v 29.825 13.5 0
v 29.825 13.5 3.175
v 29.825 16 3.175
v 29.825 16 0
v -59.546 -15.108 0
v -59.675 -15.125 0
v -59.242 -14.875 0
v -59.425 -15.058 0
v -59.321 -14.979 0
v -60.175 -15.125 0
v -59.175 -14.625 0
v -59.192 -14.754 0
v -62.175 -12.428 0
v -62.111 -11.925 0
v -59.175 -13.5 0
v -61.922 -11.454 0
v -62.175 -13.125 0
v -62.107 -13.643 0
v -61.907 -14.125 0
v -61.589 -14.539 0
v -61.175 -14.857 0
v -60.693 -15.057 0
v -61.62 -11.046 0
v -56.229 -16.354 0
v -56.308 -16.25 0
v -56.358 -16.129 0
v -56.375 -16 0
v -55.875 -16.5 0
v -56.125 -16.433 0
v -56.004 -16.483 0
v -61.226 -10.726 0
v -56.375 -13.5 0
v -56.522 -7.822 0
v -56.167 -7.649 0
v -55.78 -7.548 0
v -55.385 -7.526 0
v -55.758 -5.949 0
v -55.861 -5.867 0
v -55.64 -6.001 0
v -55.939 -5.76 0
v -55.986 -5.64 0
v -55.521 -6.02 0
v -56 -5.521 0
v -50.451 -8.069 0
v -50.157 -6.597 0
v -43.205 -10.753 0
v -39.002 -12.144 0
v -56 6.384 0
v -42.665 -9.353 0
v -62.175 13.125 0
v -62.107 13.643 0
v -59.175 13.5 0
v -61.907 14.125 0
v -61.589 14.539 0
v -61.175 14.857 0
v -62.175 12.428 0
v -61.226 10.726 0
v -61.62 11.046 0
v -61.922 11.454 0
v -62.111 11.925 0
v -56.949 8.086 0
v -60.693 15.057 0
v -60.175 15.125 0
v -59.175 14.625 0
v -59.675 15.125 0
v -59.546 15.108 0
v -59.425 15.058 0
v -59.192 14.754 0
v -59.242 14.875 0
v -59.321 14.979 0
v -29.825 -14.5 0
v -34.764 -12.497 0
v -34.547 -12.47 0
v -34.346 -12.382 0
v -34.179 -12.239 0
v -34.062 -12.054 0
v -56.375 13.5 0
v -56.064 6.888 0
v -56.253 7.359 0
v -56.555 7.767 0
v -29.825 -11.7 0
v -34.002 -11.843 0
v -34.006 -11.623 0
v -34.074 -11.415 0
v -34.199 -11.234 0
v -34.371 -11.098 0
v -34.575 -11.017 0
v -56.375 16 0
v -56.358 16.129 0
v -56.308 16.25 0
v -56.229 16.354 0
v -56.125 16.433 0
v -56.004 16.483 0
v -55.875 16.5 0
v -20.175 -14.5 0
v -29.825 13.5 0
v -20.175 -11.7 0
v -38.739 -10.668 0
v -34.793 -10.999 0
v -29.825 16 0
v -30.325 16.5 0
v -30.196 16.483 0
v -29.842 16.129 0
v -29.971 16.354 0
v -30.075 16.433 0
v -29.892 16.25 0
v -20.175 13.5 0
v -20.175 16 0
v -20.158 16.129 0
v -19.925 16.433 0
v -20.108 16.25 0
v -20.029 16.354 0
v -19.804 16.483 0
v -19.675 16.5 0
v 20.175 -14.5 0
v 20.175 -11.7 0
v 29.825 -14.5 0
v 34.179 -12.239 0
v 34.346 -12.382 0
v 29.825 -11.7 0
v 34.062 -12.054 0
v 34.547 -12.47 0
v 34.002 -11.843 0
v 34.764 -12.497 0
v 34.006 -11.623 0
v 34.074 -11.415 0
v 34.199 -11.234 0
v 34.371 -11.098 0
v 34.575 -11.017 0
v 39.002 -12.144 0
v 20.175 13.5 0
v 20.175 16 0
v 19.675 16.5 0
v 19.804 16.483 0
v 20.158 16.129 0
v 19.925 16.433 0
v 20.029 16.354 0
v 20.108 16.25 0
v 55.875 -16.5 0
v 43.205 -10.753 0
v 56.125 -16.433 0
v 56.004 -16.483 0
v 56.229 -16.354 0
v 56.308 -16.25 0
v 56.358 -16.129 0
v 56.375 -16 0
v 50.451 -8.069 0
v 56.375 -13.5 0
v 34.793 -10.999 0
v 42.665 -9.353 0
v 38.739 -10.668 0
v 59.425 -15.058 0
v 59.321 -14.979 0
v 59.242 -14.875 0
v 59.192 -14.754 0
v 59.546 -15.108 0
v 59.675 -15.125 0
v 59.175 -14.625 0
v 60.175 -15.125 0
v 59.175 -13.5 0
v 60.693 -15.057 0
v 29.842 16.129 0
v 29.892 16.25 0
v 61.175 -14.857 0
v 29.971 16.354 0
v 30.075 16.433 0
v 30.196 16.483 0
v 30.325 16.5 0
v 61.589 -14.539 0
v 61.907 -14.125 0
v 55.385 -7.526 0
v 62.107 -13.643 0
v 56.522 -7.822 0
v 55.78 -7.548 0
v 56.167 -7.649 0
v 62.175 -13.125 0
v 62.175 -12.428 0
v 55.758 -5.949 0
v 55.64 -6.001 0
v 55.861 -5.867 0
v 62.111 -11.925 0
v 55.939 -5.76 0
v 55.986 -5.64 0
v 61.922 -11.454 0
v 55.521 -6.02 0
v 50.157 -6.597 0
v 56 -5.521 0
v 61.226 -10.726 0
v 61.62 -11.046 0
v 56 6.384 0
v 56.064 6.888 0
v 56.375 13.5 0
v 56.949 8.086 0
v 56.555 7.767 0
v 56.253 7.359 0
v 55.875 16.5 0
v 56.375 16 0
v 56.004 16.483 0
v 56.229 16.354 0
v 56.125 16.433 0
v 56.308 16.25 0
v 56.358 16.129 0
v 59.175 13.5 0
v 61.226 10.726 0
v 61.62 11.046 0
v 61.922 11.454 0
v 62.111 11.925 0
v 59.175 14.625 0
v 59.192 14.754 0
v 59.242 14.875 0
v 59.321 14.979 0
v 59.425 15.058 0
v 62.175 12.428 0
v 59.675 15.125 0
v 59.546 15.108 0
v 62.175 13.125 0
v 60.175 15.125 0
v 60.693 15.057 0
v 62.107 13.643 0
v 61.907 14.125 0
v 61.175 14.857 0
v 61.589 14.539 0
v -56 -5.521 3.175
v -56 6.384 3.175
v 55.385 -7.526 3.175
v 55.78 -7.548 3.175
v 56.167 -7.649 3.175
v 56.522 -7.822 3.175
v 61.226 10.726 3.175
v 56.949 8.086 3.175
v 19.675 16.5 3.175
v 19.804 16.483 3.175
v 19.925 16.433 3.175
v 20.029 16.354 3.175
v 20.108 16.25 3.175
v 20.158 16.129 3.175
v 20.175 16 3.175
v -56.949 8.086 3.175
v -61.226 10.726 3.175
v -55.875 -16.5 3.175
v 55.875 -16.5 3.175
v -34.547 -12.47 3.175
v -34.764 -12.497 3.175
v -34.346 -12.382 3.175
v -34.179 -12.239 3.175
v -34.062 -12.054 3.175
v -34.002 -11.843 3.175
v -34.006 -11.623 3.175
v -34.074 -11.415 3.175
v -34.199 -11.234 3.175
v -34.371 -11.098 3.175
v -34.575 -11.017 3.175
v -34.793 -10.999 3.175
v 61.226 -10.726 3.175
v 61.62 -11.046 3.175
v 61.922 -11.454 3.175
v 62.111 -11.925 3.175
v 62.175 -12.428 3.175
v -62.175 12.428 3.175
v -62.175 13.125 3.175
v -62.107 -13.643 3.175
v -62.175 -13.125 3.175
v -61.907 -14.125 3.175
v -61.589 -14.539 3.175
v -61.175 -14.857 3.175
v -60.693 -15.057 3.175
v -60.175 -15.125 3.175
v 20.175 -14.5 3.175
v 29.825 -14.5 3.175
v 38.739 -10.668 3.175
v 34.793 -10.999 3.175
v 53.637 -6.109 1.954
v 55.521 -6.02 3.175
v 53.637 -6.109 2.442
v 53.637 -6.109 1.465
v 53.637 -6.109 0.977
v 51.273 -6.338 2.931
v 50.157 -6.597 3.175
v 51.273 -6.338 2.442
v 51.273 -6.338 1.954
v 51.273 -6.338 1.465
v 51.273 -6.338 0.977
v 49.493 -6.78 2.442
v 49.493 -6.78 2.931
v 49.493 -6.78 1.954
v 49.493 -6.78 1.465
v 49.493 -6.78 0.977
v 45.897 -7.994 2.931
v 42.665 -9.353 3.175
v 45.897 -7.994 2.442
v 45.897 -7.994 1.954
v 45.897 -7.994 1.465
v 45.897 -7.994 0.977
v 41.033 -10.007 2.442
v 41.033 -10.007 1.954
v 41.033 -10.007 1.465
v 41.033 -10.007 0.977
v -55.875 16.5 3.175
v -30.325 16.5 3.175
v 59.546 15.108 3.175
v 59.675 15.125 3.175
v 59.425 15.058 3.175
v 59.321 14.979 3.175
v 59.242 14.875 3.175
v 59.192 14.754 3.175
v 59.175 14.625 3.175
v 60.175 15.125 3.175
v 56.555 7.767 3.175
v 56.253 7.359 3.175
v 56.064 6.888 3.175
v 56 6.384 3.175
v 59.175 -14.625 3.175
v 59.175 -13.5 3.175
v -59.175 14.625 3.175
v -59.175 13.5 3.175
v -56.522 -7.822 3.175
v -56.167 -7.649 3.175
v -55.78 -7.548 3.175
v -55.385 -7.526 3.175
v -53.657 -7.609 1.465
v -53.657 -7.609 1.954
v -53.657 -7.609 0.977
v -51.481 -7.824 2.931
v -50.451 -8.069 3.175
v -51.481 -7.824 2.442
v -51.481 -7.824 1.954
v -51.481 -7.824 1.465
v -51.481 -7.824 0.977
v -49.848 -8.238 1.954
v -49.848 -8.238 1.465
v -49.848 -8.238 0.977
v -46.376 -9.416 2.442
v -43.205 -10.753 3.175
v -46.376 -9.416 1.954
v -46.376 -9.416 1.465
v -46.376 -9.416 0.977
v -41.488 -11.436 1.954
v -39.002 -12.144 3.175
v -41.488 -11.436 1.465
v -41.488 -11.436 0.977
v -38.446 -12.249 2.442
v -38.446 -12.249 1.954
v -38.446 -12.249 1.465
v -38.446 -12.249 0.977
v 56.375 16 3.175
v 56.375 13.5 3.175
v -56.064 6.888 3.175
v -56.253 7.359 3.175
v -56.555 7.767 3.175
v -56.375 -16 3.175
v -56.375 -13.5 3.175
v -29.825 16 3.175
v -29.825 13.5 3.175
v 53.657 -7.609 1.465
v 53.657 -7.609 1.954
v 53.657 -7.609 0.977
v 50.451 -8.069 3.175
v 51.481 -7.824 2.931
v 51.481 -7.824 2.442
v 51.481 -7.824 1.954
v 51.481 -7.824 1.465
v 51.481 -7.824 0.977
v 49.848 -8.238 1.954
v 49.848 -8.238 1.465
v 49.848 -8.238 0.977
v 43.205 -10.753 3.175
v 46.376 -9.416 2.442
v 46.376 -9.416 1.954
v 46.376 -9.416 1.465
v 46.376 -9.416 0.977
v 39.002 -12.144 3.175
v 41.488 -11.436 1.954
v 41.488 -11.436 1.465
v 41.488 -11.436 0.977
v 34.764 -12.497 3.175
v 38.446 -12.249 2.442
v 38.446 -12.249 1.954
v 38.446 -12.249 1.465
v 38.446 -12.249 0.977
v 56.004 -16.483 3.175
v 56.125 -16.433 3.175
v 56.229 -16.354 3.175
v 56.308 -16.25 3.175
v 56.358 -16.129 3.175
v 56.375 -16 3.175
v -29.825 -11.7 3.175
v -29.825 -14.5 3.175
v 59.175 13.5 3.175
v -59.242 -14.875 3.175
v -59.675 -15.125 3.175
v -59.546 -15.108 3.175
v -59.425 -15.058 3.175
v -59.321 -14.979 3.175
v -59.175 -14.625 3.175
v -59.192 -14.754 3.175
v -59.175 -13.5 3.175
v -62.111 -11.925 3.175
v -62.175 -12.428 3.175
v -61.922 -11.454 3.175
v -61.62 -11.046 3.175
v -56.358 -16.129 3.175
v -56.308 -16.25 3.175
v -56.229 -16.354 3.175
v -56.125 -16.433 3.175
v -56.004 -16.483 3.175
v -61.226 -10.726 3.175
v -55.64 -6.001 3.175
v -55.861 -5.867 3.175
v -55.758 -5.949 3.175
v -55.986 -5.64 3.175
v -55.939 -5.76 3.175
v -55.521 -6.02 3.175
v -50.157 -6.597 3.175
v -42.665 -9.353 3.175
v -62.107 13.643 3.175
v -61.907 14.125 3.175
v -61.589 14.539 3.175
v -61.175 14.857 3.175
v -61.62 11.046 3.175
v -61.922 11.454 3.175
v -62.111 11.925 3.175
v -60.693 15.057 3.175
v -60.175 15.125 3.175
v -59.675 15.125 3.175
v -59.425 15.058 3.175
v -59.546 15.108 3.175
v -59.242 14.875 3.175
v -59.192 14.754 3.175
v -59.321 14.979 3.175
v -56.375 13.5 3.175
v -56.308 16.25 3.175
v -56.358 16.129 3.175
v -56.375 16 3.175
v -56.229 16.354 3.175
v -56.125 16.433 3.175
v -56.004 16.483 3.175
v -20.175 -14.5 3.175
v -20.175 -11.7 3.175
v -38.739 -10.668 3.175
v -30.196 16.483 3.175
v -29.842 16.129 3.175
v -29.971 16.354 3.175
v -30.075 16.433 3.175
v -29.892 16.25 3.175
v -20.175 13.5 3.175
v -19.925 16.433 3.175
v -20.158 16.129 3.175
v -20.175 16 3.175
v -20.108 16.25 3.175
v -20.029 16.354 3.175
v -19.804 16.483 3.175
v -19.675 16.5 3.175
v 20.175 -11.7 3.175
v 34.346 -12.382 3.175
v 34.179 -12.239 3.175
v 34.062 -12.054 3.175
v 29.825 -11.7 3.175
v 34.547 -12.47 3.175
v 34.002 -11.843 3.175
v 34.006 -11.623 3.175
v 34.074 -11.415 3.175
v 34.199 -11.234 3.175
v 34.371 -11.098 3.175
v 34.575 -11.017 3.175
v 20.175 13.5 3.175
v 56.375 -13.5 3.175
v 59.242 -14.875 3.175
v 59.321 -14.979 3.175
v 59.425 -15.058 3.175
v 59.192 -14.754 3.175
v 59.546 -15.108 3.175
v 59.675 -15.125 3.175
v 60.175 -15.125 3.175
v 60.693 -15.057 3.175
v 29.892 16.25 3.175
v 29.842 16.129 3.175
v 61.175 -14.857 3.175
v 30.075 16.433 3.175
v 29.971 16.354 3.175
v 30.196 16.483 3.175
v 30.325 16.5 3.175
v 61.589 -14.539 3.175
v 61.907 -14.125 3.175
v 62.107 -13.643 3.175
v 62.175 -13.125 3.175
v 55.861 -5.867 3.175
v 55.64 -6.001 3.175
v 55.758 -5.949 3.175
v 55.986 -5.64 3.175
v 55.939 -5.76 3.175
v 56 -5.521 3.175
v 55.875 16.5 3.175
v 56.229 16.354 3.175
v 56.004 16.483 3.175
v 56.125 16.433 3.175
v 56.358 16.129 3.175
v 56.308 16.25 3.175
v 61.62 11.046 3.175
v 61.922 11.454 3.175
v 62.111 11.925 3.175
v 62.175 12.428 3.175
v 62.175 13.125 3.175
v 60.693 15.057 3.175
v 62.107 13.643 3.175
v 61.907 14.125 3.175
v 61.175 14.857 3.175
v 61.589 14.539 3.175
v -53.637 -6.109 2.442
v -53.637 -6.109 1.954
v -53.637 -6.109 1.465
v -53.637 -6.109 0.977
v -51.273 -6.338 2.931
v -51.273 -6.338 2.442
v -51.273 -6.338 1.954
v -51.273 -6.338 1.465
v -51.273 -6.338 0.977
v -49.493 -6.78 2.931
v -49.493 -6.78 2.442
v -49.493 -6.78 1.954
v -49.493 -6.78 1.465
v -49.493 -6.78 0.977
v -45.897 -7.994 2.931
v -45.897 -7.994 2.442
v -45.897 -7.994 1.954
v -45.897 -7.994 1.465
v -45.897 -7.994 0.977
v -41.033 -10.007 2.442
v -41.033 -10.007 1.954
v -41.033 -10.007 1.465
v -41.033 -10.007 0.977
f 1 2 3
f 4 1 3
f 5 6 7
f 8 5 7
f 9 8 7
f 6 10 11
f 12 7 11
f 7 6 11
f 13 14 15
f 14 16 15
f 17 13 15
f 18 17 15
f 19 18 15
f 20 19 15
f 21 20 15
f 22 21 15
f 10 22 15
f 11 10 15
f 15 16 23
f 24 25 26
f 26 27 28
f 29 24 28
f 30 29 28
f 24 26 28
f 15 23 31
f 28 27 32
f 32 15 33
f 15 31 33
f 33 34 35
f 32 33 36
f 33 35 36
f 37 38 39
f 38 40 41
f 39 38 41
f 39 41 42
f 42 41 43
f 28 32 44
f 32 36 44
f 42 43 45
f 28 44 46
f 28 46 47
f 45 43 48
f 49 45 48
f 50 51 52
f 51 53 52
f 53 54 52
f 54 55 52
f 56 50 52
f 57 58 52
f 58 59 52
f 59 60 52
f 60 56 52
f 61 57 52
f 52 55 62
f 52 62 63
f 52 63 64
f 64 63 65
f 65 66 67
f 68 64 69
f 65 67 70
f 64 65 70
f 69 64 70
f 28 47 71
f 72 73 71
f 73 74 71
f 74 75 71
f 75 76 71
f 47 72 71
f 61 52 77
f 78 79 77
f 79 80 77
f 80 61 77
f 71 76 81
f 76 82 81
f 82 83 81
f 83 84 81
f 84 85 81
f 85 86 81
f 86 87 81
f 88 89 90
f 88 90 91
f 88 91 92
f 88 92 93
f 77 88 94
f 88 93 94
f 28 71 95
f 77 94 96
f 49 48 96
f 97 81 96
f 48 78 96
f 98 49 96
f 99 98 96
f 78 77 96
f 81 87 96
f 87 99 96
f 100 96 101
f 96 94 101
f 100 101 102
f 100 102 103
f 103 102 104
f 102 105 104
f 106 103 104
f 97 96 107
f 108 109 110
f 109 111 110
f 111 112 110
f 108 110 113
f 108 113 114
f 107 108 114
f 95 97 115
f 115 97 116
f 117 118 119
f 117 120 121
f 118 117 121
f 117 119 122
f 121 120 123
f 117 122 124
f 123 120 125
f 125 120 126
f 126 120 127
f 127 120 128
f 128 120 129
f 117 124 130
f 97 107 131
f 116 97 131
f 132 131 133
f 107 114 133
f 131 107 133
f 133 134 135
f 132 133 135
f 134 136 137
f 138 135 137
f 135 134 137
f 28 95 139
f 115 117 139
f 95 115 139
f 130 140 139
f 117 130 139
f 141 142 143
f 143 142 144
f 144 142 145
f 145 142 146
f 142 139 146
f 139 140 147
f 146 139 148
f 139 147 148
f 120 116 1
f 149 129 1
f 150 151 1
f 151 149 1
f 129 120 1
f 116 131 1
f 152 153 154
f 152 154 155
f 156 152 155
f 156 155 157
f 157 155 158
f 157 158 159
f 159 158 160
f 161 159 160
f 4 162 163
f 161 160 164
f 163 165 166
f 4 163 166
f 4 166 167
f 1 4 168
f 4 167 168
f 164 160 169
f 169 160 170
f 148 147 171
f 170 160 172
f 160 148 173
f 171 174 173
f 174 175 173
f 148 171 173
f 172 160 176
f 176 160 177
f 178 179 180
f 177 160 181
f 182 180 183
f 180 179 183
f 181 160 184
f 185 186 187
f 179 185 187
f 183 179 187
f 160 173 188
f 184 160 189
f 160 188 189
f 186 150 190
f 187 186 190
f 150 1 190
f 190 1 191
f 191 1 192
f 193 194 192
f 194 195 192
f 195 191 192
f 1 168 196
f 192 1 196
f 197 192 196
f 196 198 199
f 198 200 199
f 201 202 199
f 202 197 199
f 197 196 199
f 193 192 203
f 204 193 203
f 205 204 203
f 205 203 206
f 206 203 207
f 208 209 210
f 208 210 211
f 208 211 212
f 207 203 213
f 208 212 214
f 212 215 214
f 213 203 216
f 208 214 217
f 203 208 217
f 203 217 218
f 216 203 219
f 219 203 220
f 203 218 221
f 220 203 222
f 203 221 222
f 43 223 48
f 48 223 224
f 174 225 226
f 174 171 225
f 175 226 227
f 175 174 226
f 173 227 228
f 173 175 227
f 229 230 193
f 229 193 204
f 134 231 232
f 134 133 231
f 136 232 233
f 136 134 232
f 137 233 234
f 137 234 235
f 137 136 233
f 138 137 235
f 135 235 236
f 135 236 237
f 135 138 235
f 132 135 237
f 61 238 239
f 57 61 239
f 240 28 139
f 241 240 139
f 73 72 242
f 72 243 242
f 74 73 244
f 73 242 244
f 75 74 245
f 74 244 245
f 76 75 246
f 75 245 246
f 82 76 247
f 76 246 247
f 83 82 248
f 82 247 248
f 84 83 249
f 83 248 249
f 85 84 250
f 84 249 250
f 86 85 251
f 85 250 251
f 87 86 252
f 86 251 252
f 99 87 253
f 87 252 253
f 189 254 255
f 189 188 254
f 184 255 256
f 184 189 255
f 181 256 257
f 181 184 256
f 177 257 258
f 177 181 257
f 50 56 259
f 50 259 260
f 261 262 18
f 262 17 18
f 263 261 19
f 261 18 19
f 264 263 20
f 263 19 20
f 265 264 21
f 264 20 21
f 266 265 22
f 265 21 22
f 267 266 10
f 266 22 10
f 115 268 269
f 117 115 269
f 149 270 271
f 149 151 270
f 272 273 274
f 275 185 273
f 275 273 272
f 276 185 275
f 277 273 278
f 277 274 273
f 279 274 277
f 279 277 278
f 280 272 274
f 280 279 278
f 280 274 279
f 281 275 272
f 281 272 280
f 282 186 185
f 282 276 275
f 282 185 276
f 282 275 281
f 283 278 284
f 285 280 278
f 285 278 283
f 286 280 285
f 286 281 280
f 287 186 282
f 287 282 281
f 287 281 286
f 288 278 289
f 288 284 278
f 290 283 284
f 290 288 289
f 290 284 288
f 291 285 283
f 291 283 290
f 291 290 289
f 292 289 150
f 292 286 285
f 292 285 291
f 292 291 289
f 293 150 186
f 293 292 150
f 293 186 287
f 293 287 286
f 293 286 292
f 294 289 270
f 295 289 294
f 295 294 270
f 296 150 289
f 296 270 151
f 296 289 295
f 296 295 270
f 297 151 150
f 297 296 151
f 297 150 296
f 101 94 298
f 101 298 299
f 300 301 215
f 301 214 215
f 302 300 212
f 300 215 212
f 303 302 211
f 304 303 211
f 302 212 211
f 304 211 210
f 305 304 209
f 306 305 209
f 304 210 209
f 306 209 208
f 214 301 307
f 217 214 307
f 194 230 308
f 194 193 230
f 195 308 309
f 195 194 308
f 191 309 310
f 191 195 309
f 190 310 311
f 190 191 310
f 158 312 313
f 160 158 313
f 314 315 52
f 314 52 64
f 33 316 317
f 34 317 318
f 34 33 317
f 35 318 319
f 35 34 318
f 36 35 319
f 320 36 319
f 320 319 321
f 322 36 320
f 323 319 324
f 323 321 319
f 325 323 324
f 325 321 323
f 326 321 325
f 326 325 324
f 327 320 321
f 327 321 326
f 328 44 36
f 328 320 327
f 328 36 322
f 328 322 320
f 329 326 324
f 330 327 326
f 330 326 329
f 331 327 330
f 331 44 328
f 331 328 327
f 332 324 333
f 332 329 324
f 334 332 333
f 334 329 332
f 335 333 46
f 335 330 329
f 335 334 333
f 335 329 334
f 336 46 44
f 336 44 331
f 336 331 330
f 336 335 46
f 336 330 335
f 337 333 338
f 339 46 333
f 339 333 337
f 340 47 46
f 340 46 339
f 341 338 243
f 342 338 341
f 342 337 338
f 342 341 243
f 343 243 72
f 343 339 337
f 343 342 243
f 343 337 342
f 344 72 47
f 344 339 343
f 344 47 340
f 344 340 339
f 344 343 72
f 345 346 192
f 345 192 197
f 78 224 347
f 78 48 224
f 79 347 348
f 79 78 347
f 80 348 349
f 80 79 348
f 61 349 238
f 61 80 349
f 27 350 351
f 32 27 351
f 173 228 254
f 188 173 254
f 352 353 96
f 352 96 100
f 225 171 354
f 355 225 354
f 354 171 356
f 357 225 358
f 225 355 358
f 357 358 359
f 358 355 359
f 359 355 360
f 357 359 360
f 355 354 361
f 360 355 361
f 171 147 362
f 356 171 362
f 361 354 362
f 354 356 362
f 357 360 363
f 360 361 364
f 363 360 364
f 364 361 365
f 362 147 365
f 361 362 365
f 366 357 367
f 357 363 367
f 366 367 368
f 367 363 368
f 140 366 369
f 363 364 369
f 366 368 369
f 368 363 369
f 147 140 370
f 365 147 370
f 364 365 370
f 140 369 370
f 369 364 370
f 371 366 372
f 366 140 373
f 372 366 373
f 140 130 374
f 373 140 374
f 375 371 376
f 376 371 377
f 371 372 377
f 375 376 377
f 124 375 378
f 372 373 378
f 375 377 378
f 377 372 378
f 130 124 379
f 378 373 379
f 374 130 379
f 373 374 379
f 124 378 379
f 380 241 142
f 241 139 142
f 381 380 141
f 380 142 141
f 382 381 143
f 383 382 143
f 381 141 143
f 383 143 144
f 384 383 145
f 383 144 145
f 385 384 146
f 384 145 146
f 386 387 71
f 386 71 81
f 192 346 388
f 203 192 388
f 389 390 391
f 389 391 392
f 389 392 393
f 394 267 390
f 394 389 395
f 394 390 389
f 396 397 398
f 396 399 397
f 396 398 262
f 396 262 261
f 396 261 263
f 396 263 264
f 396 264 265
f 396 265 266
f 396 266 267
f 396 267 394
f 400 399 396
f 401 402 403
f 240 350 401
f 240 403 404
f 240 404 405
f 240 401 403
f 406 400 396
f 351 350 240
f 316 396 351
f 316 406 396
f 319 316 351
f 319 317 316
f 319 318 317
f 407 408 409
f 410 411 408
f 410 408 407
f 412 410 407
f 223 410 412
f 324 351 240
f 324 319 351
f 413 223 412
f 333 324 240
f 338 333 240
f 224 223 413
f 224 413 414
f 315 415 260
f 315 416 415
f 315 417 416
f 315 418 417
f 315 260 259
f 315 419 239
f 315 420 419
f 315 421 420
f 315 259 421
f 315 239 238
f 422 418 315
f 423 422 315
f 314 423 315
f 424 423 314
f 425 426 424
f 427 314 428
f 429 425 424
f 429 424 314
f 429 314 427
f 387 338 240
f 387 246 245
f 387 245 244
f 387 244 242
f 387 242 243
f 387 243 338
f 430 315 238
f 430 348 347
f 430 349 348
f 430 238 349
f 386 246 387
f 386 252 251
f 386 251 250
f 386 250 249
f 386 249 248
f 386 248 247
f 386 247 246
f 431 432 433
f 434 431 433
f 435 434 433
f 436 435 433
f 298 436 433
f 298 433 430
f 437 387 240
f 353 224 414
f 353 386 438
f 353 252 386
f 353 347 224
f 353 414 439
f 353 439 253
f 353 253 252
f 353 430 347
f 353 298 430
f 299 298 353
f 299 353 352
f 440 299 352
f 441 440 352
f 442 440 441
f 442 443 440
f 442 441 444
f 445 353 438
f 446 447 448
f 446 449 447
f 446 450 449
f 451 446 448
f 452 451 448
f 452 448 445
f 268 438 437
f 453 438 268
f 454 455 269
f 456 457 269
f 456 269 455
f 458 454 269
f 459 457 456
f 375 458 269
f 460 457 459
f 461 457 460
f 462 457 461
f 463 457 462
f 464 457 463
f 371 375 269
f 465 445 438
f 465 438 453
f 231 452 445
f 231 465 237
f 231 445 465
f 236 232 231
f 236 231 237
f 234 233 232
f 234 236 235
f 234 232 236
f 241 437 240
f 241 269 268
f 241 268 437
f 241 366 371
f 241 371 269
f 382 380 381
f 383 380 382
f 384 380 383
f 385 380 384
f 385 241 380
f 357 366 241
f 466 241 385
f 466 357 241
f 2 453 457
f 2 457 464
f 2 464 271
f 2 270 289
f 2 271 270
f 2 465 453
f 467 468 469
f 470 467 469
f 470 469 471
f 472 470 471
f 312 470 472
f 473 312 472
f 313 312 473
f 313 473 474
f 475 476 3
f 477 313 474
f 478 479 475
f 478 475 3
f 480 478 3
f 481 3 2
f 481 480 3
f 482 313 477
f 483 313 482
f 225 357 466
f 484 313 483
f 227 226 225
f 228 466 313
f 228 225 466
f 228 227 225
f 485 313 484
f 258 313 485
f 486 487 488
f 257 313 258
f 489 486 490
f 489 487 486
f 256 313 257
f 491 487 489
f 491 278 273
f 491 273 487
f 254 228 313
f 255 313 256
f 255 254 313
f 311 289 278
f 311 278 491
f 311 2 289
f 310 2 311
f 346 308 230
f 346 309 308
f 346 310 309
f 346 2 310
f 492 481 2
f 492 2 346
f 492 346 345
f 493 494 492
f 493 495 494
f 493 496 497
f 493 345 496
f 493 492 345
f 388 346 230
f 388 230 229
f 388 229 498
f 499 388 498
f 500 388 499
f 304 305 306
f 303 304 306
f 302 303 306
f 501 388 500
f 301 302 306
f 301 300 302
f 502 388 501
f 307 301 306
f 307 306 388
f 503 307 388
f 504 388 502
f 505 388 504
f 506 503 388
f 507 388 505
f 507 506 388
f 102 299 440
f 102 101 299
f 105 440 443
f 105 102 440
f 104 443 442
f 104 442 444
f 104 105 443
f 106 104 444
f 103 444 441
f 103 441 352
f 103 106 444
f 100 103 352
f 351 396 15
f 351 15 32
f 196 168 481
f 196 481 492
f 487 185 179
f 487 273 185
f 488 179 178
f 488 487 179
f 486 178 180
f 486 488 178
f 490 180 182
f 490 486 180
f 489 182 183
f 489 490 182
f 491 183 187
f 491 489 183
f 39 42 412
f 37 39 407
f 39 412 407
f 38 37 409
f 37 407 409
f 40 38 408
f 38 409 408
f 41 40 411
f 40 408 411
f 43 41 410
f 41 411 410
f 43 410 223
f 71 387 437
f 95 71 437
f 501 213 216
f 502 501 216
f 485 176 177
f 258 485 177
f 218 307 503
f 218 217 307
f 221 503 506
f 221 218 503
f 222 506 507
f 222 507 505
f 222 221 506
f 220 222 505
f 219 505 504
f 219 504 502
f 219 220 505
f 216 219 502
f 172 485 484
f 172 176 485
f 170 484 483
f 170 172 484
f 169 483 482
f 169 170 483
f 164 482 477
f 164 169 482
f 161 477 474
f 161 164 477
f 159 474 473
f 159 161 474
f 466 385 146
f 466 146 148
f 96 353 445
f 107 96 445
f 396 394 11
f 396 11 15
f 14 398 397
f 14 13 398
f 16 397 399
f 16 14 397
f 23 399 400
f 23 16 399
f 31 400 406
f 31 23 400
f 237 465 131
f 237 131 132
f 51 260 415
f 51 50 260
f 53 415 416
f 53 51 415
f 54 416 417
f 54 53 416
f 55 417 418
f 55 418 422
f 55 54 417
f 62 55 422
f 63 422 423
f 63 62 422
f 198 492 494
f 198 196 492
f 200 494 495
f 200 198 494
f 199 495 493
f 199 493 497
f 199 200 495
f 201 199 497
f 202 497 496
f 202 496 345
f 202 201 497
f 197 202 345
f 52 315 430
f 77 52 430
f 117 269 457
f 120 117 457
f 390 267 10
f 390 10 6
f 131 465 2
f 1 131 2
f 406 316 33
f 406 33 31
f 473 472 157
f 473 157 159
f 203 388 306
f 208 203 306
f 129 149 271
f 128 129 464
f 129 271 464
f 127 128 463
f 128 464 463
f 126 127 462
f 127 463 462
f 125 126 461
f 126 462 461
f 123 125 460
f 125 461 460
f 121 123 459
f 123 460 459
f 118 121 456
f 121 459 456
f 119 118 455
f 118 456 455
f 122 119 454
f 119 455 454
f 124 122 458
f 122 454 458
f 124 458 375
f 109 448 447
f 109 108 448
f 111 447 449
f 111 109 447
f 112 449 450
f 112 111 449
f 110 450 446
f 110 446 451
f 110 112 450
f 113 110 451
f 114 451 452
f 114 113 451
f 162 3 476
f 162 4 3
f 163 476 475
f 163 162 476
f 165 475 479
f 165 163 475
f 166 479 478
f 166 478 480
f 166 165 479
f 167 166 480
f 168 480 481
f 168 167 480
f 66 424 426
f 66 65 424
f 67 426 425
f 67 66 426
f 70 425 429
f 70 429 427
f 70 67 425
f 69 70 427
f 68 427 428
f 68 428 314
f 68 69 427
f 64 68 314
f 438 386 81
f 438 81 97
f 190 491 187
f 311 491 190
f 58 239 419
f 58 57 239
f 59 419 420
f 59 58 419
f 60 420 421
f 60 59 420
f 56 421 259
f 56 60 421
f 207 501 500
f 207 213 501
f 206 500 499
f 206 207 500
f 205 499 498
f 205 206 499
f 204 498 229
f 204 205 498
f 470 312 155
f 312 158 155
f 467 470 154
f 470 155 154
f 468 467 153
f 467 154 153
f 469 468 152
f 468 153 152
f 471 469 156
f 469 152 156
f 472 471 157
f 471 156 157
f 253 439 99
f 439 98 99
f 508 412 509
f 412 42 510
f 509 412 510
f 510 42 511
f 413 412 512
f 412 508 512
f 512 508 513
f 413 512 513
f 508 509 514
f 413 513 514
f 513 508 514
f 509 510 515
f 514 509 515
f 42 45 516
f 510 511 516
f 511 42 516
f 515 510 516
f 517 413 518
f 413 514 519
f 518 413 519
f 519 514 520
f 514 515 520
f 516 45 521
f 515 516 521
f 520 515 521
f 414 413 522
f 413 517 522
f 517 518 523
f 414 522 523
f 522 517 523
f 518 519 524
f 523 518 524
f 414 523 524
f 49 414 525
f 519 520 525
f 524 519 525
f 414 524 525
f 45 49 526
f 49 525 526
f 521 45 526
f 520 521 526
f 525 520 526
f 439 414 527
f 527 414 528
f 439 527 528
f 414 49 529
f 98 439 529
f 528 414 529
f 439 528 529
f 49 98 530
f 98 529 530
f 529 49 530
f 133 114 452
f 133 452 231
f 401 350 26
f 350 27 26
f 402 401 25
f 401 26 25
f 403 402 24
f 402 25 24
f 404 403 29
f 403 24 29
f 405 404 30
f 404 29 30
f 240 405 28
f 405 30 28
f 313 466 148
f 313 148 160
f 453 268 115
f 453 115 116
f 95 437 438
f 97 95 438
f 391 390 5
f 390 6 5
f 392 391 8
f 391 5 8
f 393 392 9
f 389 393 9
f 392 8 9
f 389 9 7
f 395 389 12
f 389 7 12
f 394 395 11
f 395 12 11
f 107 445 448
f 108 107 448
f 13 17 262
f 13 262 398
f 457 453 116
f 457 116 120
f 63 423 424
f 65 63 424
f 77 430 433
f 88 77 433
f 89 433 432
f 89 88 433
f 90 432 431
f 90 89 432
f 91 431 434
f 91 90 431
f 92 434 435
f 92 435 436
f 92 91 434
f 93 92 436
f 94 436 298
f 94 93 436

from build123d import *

# Parameters (mm, degrees)
SKETCH1_W           = 124.35
SKETCH1_H           = 33
BOSS_EXTRUDE1_DEPTH = 3.175
SKETCH2_W           = 9.65
SKETCH2_H           = 2.8
SKETCH2_H_2         = 3
CUT_EXTRUDE1_DEPTH  = 65.405444257
SKETCH4_W           = 2.8
SKETCH4_H           = 3
SKETCH4_W_2         = 6.175
SKETCH4_H_2         = 15
CUT_EXTRUDE2_DEPTH  = 65.405444257
SKETCH6_W           = 3
SKETCH6_H           = 1.375
CUT_EXTRUDE3_DEPTH  = 65.405444257
CUT_SWEEP1_DEPTH    = 3.175
SKETCH12_R          = 0.75
CUT_EXTRUDE6_DEPTH  = 65.405444385
CUT_EXTRUDE7_DEPTH  = 65.405444385
FILLET6_R           = 2
FILLET7_R           = 0.5


# Read off the part's stored shape, not the designer's step: Cut-Sweep1
with BuildPart() as part:
    # Sketch1 → Boss-Extrude1 (new body)
    with BuildSketch(Plane.XY):
        Rectangle(SKETCH1_W, SKETCH1_H)
    extrude(amount=BOSS_EXTRUDE1_DEPTH)

    # Sketch2 → Cut-Extrude1 (cut, through all)
    with BuildSketch(Plane.XY.offset(3.175)):
        with Locations((-25, -13.1)):
            Rectangle(SKETCH2_W, SKETCH2_H)
        with Locations((25, -13.1)):
            Rectangle(SKETCH2_W, SKETCH2_H)
        with Locations((-25, 15)):
            Rectangle(SKETCH2_W, SKETCH2_H_2)
        with Locations((25, 15)):
            Rectangle(SKETCH2_W, SKETCH2_H_2)
    extrude(amount=-CUT_EXTRUDE1_DEPTH, mode=Mode.SUBTRACT)

    # Sketch4 → Cut-Extrude2 (cut, through all)
    with BuildSketch(Plane.XY.offset(3.175)):
        with Locations((-57.775, 15)):
            Rectangle(SKETCH4_W, SKETCH4_H)
        with Locations((-59.0875, 0)):
            Rectangle(SKETCH4_W_2, SKETCH4_H_2)
        with Locations((-57.775, -15)):
            Rectangle(SKETCH4_W, SKETCH4_H)
        with Locations((57.775, 15)):
            Rectangle(SKETCH4_W, SKETCH4_H)
        with Locations((59.0875, 0)):
            Rectangle(SKETCH4_W_2, SKETCH4_H_2)
        with Locations((57.775, -15)):
            Rectangle(SKETCH4_W, SKETCH4_H)
    extrude(amount=-CUT_EXTRUDE2_DEPTH, mode=Mode.SUBTRACT)

    # Sketch6 → Cut-Extrude3 (cut, through all)
    with BuildSketch(Plane.XY.offset(3.175)):
        with Locations((-60.675, 15.8125)):
            Rectangle(SKETCH6_W, SKETCH6_H)
        with Locations((-60.675, -15.8125)):
            Rectangle(SKETCH6_W, SKETCH6_H)
        with Locations((60.675, 15.8125)):
            Rectangle(SKETCH6_W, SKETCH6_H)
        with Locations((60.675, -15.8125)):
            Rectangle(SKETCH6_W, SKETCH6_H)
    extrude(amount=-CUT_EXTRUDE3_DEPTH, mode=Mode.SUBTRACT)

    # Cut-Sweep1 outline → Cut-Sweep1 (cut)
    with BuildSketch(Plane.XY):
        with BuildLine():
            add(Edge.make_bspline(
                [(-56, -6), (-55.016272395, -6.040912607), (-53.484317245, -6.110006936), (-52.10462272, -6.208217255), (-51.370216858, -6.312882143), (-50.849013323, -6.424427059), (-50.274077583, -6.562740427), (-49.507561658, -6.770408498), (-47.98416767, -7.234467607), (-46.535590196, -7.742954919), (-44.899823838, -8.383891144), (-43.265010906, -9.091671777), (-41.074137026, -10.055384808), (-38.357692762, -10.850187014), (-36.1078612, -11.027108547), (-34.793437631, -10.999002823)],
                knots=[0, 0, 0, 0, 0.052266667, 0.104533333, 0.1568, 0.188540911, 0.209066667, 0.261333333, 0.3136, 0.4368, 0.46346514, 0.56, 0.706666667, 0.853333333, 1, 1, 1, 1], degree=3))
            Line((-56, -6), (-56, -7.5))
            add(Edge.make_bspline(
                [(-56, -7.5), (-55.020423649, -7.540842864), (-53.496771007, -7.609797709), (-52.171479553, -7.70829789), (-51.569513747, -7.80075633), (-51.115986388, -7.900930823), (-50.592043829, -8.028791809), (-49.863497697, -8.22781936), (-48.398796638, -8.676488924), (-46.992197023, -9.172450468), (-45.412650318, -9.7933523), (-43.831176536, -10.480660701), (-41.561928867, -11.478467634), (-38.556226285, -12.350501385), (-36.110914304, -12.525218982), (-34.698750526, -12.49601129)],
                knots=[0, 0, 0, 0, 0.052266667, 0.104533333, 0.1568, 0.188540911, 0.209066667, 0.261333333, 0.3136, 0.4368, 0.46346514, 0.56, 0.706666667, 0.853333333, 1, 1, 1, 1], degree=3))
            Line((-34.698750526, -12.49601129), (-34.793437631, -10.999002823))
        make_face()
    cut_sweep1 = extrude(amount=CUT_SWEEP1_DEPTH, mode=Mode.SUBTRACT)

    # Mirror1: Cut-Sweep1 across plane
    add(cut_sweep1.mirror(Plane.ZY), mode=Mode.SUBTRACT)

    # Sketch12 → Cut-Extrude6 (cut, through all)
    with BuildSketch(Plane.XY.offset(3.175)):
        with Locations((-34.746094079, -11.747507056)):
            Circle(SKETCH12_R)
        with Locations((34.746094079, -11.747507056)):
            Circle(SKETCH12_R)
    extrude(amount=-CUT_EXTRUDE6_DEPTH, mode=Mode.SUBTRACT)

    # Sketch13 → Cut-Extrude7 (cut, through all)
    with BuildSketch(Plane.XY.offset(3.175)):
        Polygon((-56, 7.5), (-62.175, 11.3125), (-62.175, 7.5), align=None)
        Polygon((-56, -7.5), (-62.175, -11.3125), (-62.175, -7.5), align=None)
        Polygon((56, 7.5), (62.175, 11.3125), (62.175, 7.5), align=None)
        Polygon((56, -7.5), (62.175, -11.3125), (62.175, -7.5), align=None)
    extrude(amount=-CUT_EXTRUDE7_DEPTH, mode=Mode.SUBTRACT)

    # Fillet6
    fillet6_edges = [part.edges().sort_by_distance(p)[0] for p in [
        (62.175, -15.125, 1.5875),
        (62.175, -11.3125, 1.5875),
        (56, -7.5, 1.5875),
        (56, 7.5, 1.5875),
        (62.175, 11.3125, 1.5875),
        (62.175, 15.125, 1.5875),
        (-62.175, -15.125, 1.5875),
        (-62.175, -11.3125, 1.5875),
        (-56, -7.5, 1.5875),
        (-62.175, 15.125, 1.5875),
        (-62.175, 11.3125, 1.5875),
        (-56, 7.5, 1.5875),
    ]]
    fillet(fillet6_edges, radius=FILLET6_R)

    # Fillet7
    fillet7_edges = [part.edges().sort_by_distance(p)[0] for p in [
        (59.175, 15.125, 1.5875),
        (59.175, -15.125, 1.5875),
        (-59.175, -15.125, 1.5875),
        (-59.175, 15.125, 1.5875),
        (20.175, 16.5, 1.5875),
        (29.825, 16.5, 1.5875),
        (-20.175, 16.5, 1.5875),
        (-29.825, 16.5, 1.5875),
        (56.375, -16.5, 1.5875),
        (56, -6, 1.5875),
        (56.375, 16.5, 1.5875),
        (-56.375, 16.5, 1.5875),
        (-56.375, -16.5, 1.5875),
        (-56, -6, 1.5875),
    ]]
    fillet(fillet7_edges, radius=FILLET7_R)


solid = part.part
